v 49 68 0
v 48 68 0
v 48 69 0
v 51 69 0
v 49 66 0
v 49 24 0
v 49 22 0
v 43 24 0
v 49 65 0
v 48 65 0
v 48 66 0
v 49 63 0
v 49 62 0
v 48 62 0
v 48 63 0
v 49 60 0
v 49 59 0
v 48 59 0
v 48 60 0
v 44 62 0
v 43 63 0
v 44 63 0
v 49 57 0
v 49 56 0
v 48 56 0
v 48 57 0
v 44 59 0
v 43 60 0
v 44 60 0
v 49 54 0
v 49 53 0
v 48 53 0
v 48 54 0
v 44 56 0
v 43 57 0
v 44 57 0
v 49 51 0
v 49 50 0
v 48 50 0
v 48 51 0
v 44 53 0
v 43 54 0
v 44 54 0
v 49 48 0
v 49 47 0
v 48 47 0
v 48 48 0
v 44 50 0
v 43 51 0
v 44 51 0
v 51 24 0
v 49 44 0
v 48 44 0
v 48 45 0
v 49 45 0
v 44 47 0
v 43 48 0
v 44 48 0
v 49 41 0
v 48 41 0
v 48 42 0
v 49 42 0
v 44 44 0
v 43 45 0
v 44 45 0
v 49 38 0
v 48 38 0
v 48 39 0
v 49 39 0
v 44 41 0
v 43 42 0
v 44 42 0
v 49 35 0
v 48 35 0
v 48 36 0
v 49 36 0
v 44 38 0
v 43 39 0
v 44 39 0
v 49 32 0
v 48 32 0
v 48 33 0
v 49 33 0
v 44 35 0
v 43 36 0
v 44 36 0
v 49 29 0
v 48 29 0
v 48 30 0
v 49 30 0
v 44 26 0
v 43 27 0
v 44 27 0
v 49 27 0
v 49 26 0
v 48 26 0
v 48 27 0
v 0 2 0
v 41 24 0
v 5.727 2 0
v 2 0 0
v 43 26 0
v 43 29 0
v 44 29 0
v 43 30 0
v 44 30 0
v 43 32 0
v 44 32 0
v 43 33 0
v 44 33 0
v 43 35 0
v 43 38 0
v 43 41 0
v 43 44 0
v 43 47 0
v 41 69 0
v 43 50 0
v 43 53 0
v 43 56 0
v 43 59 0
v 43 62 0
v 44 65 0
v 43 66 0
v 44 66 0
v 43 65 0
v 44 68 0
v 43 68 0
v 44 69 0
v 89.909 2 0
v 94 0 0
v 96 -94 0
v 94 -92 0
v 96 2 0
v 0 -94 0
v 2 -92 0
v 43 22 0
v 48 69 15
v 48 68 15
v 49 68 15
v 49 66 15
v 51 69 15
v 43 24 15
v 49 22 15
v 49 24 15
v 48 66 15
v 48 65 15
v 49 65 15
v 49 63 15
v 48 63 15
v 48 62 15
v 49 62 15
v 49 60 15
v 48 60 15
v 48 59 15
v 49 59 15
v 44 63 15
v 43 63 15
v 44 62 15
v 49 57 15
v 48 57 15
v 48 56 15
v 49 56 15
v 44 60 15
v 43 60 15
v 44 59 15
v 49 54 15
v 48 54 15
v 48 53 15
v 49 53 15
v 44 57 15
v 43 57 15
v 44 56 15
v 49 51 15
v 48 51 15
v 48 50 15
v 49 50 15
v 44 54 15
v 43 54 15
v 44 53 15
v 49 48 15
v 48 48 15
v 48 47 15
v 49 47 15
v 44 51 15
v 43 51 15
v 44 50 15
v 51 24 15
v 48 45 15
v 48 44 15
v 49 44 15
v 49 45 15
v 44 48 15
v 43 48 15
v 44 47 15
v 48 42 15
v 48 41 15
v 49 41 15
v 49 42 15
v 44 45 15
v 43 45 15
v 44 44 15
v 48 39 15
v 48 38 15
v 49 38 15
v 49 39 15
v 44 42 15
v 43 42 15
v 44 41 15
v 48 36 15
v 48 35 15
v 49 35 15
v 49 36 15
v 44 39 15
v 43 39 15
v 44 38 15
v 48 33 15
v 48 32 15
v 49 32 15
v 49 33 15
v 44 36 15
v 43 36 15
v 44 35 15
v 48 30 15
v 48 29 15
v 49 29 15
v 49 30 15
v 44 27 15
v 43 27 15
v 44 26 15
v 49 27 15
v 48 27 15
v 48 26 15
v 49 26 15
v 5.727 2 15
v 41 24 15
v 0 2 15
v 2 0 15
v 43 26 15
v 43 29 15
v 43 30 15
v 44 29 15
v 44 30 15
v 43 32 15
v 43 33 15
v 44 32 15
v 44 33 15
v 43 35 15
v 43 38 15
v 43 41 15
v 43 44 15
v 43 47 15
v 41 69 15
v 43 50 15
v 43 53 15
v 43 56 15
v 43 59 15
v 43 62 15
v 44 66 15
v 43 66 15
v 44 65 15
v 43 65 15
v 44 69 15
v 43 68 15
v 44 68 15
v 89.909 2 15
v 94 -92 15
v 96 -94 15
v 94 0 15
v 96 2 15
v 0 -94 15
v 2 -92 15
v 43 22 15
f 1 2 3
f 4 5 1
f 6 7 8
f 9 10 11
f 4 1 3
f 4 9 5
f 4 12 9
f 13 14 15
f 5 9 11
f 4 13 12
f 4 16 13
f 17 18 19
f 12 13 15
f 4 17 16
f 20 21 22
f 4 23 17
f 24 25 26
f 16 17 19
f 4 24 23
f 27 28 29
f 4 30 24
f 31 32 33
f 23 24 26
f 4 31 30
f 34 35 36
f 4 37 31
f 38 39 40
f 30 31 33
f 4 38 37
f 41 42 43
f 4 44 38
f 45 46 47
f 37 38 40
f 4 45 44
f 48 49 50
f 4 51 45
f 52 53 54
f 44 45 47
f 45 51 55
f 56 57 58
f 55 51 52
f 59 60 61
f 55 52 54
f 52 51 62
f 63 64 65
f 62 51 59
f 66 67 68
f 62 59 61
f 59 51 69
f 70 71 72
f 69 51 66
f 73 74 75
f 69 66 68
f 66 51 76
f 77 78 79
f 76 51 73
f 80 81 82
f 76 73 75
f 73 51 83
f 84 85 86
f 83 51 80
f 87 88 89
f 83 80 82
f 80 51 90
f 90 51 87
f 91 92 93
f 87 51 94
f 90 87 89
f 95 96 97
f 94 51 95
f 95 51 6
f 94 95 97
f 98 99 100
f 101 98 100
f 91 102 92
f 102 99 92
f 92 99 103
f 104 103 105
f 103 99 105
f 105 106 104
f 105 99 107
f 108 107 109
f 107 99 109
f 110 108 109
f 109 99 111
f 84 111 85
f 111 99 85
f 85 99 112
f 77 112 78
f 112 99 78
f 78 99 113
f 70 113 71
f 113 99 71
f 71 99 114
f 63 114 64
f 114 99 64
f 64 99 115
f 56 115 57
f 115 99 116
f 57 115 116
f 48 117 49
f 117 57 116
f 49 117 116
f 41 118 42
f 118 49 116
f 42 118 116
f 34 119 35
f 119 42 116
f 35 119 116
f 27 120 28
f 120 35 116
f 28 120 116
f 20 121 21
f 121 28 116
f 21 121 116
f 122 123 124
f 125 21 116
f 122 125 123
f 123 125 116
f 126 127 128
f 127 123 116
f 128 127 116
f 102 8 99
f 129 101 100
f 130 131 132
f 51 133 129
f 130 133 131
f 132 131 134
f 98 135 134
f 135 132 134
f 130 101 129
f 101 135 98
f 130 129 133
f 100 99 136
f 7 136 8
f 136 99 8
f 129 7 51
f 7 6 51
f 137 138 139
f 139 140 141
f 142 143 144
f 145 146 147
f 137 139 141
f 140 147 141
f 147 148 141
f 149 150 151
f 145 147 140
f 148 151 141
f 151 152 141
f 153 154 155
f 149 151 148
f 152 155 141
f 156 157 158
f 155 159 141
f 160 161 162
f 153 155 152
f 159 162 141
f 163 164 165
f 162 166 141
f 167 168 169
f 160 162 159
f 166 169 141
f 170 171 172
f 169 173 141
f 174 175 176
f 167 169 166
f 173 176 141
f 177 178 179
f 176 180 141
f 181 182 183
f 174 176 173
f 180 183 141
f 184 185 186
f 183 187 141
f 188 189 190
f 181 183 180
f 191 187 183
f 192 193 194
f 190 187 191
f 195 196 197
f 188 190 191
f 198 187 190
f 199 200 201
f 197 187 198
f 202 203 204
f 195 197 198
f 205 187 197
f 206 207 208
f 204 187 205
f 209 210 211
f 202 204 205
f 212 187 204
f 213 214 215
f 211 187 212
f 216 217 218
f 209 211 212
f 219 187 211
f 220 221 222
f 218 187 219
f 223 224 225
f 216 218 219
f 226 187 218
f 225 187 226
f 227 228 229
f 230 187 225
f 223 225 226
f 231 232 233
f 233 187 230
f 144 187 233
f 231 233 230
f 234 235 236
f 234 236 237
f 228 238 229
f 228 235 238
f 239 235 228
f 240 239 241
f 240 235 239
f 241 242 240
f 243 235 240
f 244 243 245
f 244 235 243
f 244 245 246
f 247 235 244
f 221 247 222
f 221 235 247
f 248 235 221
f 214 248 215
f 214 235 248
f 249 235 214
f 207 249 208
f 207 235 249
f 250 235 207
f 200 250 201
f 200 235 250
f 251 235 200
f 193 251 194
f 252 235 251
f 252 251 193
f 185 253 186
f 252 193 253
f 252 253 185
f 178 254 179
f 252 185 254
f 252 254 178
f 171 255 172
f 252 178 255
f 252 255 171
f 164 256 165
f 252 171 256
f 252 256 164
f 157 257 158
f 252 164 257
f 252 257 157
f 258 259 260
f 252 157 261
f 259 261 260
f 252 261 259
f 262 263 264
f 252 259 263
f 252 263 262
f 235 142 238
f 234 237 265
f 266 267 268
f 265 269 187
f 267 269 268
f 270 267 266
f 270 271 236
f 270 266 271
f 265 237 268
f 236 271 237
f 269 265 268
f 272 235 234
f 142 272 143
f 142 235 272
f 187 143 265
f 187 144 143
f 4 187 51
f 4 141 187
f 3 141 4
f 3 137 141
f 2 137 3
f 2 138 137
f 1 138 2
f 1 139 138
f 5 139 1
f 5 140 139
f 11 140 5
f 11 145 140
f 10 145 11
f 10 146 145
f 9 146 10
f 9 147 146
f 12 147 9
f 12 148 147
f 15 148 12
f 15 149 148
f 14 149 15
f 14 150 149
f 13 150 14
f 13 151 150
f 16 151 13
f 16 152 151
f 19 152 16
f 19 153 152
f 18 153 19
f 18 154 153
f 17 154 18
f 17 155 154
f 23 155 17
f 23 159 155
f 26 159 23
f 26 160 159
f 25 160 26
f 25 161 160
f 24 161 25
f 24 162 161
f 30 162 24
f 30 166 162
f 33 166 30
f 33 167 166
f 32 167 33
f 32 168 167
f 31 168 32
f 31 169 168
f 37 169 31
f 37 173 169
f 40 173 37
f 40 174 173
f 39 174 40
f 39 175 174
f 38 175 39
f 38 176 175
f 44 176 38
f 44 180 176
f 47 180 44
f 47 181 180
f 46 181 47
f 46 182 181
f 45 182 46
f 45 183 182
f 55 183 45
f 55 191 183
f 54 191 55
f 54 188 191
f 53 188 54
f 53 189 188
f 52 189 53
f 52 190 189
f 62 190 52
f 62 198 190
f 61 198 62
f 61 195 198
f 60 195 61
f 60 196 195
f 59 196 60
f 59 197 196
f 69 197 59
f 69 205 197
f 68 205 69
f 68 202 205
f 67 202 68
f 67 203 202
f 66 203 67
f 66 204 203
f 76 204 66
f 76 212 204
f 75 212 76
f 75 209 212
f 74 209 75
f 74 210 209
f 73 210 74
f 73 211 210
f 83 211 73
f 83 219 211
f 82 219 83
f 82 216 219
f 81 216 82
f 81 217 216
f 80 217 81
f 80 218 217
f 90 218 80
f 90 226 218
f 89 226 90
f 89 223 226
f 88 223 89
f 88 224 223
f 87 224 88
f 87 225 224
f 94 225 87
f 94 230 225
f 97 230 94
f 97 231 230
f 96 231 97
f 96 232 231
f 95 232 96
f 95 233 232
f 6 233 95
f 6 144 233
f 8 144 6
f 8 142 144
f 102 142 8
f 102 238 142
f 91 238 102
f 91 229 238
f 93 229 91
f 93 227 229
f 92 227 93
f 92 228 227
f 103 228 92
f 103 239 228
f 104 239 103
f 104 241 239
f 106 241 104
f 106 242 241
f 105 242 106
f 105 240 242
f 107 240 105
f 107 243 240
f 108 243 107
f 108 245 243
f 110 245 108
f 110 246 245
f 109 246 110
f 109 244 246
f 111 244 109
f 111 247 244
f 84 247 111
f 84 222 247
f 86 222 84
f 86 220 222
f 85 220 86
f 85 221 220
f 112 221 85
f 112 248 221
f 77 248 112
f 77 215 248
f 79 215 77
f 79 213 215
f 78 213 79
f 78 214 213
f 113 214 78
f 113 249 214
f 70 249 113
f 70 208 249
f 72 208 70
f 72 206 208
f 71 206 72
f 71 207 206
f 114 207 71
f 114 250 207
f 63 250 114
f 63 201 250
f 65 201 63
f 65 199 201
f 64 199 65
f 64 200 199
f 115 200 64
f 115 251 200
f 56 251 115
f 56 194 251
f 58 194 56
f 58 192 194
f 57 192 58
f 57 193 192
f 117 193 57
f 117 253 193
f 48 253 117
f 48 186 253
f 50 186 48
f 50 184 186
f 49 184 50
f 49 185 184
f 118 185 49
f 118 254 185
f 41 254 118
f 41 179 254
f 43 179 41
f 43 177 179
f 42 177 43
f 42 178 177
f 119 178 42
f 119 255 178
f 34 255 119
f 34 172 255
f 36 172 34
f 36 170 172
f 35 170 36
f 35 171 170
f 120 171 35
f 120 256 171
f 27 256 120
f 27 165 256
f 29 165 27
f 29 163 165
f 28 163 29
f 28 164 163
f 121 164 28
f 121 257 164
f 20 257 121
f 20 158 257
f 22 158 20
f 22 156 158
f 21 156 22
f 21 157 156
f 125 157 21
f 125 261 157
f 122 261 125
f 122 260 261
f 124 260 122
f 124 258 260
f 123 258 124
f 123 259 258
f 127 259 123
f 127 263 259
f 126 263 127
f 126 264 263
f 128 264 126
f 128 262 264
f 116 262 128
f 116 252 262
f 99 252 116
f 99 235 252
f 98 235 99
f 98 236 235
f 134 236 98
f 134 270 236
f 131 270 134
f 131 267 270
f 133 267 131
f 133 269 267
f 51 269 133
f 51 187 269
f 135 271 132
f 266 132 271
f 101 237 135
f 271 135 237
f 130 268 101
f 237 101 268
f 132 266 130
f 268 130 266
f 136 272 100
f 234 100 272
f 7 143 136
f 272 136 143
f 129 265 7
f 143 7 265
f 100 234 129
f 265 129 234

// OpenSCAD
// Fan Holder
// Designed to hold a power supply fan / PC chasis fan and attach to the mount lasso

module fanHolder() {
    thickness = 2;
    rectLength = 92;
    rectHeight = 92;
    triangleTopLength = 10;
    triangleHeight = 20;
    armLength = 45;
    armSideThickness = 2;
    teethLength = 1;
    teethHeight = 1;
    grooveLength = 2;
    componentWidth = 15;

    linear_extrude(height=componentWidth){
        // main rectangle
        square([rectLength+(2*thickness),thickness]);
        translate([0,-rectHeight-thickness]) square([rectLength+(2*thickness),thickness]);
        translate([0,-rectHeight]) square([thickness,rectHeight]);
        translate([rectLength+thickness,-rectHeight]) square([thickness,rectHeight]);
        // triangle piece
        translate([(rectLength/2)-(triangleTopLength/2),thickness+triangleHeight])
            square([triangleTopLength, thickness]);
        hull() {
            square([thickness,thickness]);
            translate([(rectLength/2)-(triangleTopLength/2),thickness+triangleHeight])
                square([thickness,thickness]);
        }
        hull() {
            translate([rectLength+thickness,0]) square([thickness,thickness]);
            translate([(rectLength/2)+(triangleTopLength/2)-thickness,thickness+triangleHeight])
                square([thickness,thickness]);
        }
        // teethed arm
        translate([(rectLength/2)-(triangleTopLength/2),(2*thickness)+triangleHeight])
        difference() {
            square([triangleTopLength,armLength]);
            // cut out middle of arm
            translate([armSideThickness+teethHeight,0])
                square([triangleTopLength-(armSideThickness*2)-(teethHeight*2),armLength]);
            // cut out teeth
            numGrooves = round(armLength/(grooveLength+teethLength));
            for(idx=[0:numGrooves-1]) {
                translate([armSideThickness,idx*(grooveLength+teethLength)]) {
                    square([triangleTopLength-(armSideThickness*2), grooveLength]);
                }
            }
        }
    }
}
fanHolder();
